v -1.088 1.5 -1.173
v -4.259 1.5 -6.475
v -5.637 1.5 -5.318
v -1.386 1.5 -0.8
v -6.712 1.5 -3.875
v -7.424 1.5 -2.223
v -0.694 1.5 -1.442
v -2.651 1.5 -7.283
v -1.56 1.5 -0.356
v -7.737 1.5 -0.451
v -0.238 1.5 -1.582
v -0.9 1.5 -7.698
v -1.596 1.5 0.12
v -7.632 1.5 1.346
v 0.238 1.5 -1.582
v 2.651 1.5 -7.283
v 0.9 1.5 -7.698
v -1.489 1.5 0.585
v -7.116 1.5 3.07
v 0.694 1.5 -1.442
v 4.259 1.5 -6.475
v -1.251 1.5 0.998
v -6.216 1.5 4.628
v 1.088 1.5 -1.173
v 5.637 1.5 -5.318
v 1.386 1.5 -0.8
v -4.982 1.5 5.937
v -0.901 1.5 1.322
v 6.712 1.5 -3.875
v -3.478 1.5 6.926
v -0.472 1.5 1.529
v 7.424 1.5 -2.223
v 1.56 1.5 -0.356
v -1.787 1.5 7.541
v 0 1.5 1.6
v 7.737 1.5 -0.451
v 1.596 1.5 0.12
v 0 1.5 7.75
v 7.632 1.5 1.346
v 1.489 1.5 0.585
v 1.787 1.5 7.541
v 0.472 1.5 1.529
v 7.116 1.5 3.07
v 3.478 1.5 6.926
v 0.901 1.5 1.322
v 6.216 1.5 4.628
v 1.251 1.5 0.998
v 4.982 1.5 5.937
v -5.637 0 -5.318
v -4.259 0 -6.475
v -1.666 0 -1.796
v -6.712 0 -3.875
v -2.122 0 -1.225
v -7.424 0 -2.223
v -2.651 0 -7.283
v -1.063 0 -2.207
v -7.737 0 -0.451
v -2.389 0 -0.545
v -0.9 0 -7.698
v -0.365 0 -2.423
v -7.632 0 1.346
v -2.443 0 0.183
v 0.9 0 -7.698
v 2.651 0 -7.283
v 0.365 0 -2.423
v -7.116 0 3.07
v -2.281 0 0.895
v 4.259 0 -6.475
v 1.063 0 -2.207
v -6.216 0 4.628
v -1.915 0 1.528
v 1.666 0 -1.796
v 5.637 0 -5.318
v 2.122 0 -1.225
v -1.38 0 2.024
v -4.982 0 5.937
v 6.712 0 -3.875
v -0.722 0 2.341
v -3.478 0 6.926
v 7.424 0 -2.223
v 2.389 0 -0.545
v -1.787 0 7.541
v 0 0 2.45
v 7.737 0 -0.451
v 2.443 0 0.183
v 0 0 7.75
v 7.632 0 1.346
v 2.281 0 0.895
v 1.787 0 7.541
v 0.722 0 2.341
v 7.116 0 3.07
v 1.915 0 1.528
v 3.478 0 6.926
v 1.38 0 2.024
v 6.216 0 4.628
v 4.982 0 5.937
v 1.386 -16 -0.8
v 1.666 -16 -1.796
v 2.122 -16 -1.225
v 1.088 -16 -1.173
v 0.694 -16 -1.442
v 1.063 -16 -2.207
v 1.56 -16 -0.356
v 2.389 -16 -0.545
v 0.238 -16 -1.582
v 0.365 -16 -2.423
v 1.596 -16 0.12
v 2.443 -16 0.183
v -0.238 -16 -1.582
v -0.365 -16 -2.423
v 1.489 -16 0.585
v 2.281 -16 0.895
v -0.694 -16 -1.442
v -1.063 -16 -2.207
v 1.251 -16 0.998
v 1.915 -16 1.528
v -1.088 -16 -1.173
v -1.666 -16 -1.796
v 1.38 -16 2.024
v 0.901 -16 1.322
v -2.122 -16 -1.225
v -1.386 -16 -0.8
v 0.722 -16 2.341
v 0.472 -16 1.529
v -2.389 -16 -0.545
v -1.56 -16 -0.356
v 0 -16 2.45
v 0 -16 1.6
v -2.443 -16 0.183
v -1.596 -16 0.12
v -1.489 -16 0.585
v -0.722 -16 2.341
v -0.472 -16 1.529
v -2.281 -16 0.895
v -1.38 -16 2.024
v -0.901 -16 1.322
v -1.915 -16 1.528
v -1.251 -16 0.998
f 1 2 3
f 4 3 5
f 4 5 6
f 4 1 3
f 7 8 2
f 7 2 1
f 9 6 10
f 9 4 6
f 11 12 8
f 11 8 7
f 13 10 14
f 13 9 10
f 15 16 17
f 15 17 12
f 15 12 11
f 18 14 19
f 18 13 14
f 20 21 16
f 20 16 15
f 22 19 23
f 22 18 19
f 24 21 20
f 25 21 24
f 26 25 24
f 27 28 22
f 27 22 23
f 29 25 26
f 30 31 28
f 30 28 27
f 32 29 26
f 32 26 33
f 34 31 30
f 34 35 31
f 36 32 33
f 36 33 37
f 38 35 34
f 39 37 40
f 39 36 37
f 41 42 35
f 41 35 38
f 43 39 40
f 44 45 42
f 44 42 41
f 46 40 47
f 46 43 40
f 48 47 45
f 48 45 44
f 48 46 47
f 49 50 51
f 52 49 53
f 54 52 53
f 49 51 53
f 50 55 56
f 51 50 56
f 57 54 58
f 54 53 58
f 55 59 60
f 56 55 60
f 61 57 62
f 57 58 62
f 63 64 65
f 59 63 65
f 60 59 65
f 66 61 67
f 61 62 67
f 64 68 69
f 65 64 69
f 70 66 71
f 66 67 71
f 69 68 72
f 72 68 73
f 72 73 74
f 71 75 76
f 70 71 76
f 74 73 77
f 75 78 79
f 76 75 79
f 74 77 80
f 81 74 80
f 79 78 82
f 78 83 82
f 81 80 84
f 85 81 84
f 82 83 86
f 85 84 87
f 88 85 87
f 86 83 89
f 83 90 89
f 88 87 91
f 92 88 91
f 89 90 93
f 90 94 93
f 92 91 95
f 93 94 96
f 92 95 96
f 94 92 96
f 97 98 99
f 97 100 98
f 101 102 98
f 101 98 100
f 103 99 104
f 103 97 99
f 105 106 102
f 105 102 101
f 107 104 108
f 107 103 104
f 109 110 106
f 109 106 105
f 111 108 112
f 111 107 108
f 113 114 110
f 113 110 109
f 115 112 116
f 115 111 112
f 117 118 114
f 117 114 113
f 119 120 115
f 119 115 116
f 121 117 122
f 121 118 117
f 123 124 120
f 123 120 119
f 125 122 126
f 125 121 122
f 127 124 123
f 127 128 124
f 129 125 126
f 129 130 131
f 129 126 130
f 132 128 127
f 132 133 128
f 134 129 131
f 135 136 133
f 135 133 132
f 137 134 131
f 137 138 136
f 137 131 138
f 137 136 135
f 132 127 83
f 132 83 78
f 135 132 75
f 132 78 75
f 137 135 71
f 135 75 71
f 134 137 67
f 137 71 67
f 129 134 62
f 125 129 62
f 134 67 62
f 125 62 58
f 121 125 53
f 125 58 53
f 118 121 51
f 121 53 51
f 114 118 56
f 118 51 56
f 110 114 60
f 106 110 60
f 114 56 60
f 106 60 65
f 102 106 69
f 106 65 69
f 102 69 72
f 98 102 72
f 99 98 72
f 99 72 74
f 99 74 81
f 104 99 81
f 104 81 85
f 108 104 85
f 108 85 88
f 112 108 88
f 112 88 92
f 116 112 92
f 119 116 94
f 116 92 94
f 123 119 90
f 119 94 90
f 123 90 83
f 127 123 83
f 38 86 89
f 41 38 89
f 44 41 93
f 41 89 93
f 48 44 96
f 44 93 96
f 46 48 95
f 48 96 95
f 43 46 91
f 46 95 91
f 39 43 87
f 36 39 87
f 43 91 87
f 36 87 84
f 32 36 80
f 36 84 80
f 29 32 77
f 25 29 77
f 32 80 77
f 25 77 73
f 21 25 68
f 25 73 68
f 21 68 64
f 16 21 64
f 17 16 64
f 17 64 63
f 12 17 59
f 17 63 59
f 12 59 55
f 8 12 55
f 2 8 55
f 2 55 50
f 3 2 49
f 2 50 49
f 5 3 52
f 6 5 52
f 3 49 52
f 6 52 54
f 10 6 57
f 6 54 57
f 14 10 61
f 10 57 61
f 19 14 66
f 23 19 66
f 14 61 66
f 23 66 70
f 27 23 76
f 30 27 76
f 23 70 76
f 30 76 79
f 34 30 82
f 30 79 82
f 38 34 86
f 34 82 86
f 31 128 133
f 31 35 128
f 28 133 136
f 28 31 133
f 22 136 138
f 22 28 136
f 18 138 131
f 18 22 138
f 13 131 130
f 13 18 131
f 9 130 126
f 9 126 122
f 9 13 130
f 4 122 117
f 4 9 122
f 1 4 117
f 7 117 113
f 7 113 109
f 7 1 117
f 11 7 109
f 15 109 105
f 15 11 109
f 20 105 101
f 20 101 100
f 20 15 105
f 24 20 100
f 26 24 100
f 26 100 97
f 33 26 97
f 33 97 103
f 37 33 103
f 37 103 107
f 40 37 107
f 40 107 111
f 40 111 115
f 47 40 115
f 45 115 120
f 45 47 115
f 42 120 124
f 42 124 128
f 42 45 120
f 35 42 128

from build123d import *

# Parameters (mm, degrees)
SKETCH1_R           = 7.75
SKETCH1_R_2         = 6.75
BOSS_EXTRUDE1_DEPTH = 1.5
SKETCH2_R           = 1.6
CUT_EXTRUDE3_DEPTH  = 12.062323445
SKETCH5_R           = 2.45
SKETCH5_R_2         = 1.6
BOSS_EXTRUDE3_DEPTH = 16


with BuildPart() as part:
    # Sketch1 → Boss-Extrude1 (new body)
    with BuildSketch(Plane(origin=(0, 0, 0), x_dir=(1, 0, 0), z_dir=(0, 1, 0))):
        with Locations(Location((0, 0, 0), (0, 0, 270))):
            Circle(SKETCH1_R)
        Circle(SKETCH1_R_2, mode=Mode.SUBTRACT)
        Circle(SKETCH1_R_2)
    extrude(amount=BOSS_EXTRUDE1_DEPTH)

    # Sketch2 → Cut-Extrude3 (cut, through all)
    with BuildSketch(Plane(origin=(0, 1.5, 0), x_dir=(1, 0, 0), z_dir=(0, 1, 0))):
        with Locations(Location((0, 0, 0), (0, 0, 270))):
            Circle(SKETCH2_R)
    extrude(amount=-CUT_EXTRUDE3_DEPTH, mode=Mode.SUBTRACT)

    # Sketch5 → Boss-Extrude3 (add)
    with BuildSketch(Plane(origin=(0, 0, 0), x_dir=(-1, 0, 0), z_dir=(0, -1, 0))):
        with Locations(Location((0, 0, 0), (0, 0, 270))):
            Circle(SKETCH5_R)
        with Locations(Location((0, 0, 0), (0, 0, 270))):
            Circle(SKETCH5_R_2, mode=Mode.SUBTRACT)
    extrude(amount=BOSS_EXTRUDE3_DEPTH)


solid = part.part
